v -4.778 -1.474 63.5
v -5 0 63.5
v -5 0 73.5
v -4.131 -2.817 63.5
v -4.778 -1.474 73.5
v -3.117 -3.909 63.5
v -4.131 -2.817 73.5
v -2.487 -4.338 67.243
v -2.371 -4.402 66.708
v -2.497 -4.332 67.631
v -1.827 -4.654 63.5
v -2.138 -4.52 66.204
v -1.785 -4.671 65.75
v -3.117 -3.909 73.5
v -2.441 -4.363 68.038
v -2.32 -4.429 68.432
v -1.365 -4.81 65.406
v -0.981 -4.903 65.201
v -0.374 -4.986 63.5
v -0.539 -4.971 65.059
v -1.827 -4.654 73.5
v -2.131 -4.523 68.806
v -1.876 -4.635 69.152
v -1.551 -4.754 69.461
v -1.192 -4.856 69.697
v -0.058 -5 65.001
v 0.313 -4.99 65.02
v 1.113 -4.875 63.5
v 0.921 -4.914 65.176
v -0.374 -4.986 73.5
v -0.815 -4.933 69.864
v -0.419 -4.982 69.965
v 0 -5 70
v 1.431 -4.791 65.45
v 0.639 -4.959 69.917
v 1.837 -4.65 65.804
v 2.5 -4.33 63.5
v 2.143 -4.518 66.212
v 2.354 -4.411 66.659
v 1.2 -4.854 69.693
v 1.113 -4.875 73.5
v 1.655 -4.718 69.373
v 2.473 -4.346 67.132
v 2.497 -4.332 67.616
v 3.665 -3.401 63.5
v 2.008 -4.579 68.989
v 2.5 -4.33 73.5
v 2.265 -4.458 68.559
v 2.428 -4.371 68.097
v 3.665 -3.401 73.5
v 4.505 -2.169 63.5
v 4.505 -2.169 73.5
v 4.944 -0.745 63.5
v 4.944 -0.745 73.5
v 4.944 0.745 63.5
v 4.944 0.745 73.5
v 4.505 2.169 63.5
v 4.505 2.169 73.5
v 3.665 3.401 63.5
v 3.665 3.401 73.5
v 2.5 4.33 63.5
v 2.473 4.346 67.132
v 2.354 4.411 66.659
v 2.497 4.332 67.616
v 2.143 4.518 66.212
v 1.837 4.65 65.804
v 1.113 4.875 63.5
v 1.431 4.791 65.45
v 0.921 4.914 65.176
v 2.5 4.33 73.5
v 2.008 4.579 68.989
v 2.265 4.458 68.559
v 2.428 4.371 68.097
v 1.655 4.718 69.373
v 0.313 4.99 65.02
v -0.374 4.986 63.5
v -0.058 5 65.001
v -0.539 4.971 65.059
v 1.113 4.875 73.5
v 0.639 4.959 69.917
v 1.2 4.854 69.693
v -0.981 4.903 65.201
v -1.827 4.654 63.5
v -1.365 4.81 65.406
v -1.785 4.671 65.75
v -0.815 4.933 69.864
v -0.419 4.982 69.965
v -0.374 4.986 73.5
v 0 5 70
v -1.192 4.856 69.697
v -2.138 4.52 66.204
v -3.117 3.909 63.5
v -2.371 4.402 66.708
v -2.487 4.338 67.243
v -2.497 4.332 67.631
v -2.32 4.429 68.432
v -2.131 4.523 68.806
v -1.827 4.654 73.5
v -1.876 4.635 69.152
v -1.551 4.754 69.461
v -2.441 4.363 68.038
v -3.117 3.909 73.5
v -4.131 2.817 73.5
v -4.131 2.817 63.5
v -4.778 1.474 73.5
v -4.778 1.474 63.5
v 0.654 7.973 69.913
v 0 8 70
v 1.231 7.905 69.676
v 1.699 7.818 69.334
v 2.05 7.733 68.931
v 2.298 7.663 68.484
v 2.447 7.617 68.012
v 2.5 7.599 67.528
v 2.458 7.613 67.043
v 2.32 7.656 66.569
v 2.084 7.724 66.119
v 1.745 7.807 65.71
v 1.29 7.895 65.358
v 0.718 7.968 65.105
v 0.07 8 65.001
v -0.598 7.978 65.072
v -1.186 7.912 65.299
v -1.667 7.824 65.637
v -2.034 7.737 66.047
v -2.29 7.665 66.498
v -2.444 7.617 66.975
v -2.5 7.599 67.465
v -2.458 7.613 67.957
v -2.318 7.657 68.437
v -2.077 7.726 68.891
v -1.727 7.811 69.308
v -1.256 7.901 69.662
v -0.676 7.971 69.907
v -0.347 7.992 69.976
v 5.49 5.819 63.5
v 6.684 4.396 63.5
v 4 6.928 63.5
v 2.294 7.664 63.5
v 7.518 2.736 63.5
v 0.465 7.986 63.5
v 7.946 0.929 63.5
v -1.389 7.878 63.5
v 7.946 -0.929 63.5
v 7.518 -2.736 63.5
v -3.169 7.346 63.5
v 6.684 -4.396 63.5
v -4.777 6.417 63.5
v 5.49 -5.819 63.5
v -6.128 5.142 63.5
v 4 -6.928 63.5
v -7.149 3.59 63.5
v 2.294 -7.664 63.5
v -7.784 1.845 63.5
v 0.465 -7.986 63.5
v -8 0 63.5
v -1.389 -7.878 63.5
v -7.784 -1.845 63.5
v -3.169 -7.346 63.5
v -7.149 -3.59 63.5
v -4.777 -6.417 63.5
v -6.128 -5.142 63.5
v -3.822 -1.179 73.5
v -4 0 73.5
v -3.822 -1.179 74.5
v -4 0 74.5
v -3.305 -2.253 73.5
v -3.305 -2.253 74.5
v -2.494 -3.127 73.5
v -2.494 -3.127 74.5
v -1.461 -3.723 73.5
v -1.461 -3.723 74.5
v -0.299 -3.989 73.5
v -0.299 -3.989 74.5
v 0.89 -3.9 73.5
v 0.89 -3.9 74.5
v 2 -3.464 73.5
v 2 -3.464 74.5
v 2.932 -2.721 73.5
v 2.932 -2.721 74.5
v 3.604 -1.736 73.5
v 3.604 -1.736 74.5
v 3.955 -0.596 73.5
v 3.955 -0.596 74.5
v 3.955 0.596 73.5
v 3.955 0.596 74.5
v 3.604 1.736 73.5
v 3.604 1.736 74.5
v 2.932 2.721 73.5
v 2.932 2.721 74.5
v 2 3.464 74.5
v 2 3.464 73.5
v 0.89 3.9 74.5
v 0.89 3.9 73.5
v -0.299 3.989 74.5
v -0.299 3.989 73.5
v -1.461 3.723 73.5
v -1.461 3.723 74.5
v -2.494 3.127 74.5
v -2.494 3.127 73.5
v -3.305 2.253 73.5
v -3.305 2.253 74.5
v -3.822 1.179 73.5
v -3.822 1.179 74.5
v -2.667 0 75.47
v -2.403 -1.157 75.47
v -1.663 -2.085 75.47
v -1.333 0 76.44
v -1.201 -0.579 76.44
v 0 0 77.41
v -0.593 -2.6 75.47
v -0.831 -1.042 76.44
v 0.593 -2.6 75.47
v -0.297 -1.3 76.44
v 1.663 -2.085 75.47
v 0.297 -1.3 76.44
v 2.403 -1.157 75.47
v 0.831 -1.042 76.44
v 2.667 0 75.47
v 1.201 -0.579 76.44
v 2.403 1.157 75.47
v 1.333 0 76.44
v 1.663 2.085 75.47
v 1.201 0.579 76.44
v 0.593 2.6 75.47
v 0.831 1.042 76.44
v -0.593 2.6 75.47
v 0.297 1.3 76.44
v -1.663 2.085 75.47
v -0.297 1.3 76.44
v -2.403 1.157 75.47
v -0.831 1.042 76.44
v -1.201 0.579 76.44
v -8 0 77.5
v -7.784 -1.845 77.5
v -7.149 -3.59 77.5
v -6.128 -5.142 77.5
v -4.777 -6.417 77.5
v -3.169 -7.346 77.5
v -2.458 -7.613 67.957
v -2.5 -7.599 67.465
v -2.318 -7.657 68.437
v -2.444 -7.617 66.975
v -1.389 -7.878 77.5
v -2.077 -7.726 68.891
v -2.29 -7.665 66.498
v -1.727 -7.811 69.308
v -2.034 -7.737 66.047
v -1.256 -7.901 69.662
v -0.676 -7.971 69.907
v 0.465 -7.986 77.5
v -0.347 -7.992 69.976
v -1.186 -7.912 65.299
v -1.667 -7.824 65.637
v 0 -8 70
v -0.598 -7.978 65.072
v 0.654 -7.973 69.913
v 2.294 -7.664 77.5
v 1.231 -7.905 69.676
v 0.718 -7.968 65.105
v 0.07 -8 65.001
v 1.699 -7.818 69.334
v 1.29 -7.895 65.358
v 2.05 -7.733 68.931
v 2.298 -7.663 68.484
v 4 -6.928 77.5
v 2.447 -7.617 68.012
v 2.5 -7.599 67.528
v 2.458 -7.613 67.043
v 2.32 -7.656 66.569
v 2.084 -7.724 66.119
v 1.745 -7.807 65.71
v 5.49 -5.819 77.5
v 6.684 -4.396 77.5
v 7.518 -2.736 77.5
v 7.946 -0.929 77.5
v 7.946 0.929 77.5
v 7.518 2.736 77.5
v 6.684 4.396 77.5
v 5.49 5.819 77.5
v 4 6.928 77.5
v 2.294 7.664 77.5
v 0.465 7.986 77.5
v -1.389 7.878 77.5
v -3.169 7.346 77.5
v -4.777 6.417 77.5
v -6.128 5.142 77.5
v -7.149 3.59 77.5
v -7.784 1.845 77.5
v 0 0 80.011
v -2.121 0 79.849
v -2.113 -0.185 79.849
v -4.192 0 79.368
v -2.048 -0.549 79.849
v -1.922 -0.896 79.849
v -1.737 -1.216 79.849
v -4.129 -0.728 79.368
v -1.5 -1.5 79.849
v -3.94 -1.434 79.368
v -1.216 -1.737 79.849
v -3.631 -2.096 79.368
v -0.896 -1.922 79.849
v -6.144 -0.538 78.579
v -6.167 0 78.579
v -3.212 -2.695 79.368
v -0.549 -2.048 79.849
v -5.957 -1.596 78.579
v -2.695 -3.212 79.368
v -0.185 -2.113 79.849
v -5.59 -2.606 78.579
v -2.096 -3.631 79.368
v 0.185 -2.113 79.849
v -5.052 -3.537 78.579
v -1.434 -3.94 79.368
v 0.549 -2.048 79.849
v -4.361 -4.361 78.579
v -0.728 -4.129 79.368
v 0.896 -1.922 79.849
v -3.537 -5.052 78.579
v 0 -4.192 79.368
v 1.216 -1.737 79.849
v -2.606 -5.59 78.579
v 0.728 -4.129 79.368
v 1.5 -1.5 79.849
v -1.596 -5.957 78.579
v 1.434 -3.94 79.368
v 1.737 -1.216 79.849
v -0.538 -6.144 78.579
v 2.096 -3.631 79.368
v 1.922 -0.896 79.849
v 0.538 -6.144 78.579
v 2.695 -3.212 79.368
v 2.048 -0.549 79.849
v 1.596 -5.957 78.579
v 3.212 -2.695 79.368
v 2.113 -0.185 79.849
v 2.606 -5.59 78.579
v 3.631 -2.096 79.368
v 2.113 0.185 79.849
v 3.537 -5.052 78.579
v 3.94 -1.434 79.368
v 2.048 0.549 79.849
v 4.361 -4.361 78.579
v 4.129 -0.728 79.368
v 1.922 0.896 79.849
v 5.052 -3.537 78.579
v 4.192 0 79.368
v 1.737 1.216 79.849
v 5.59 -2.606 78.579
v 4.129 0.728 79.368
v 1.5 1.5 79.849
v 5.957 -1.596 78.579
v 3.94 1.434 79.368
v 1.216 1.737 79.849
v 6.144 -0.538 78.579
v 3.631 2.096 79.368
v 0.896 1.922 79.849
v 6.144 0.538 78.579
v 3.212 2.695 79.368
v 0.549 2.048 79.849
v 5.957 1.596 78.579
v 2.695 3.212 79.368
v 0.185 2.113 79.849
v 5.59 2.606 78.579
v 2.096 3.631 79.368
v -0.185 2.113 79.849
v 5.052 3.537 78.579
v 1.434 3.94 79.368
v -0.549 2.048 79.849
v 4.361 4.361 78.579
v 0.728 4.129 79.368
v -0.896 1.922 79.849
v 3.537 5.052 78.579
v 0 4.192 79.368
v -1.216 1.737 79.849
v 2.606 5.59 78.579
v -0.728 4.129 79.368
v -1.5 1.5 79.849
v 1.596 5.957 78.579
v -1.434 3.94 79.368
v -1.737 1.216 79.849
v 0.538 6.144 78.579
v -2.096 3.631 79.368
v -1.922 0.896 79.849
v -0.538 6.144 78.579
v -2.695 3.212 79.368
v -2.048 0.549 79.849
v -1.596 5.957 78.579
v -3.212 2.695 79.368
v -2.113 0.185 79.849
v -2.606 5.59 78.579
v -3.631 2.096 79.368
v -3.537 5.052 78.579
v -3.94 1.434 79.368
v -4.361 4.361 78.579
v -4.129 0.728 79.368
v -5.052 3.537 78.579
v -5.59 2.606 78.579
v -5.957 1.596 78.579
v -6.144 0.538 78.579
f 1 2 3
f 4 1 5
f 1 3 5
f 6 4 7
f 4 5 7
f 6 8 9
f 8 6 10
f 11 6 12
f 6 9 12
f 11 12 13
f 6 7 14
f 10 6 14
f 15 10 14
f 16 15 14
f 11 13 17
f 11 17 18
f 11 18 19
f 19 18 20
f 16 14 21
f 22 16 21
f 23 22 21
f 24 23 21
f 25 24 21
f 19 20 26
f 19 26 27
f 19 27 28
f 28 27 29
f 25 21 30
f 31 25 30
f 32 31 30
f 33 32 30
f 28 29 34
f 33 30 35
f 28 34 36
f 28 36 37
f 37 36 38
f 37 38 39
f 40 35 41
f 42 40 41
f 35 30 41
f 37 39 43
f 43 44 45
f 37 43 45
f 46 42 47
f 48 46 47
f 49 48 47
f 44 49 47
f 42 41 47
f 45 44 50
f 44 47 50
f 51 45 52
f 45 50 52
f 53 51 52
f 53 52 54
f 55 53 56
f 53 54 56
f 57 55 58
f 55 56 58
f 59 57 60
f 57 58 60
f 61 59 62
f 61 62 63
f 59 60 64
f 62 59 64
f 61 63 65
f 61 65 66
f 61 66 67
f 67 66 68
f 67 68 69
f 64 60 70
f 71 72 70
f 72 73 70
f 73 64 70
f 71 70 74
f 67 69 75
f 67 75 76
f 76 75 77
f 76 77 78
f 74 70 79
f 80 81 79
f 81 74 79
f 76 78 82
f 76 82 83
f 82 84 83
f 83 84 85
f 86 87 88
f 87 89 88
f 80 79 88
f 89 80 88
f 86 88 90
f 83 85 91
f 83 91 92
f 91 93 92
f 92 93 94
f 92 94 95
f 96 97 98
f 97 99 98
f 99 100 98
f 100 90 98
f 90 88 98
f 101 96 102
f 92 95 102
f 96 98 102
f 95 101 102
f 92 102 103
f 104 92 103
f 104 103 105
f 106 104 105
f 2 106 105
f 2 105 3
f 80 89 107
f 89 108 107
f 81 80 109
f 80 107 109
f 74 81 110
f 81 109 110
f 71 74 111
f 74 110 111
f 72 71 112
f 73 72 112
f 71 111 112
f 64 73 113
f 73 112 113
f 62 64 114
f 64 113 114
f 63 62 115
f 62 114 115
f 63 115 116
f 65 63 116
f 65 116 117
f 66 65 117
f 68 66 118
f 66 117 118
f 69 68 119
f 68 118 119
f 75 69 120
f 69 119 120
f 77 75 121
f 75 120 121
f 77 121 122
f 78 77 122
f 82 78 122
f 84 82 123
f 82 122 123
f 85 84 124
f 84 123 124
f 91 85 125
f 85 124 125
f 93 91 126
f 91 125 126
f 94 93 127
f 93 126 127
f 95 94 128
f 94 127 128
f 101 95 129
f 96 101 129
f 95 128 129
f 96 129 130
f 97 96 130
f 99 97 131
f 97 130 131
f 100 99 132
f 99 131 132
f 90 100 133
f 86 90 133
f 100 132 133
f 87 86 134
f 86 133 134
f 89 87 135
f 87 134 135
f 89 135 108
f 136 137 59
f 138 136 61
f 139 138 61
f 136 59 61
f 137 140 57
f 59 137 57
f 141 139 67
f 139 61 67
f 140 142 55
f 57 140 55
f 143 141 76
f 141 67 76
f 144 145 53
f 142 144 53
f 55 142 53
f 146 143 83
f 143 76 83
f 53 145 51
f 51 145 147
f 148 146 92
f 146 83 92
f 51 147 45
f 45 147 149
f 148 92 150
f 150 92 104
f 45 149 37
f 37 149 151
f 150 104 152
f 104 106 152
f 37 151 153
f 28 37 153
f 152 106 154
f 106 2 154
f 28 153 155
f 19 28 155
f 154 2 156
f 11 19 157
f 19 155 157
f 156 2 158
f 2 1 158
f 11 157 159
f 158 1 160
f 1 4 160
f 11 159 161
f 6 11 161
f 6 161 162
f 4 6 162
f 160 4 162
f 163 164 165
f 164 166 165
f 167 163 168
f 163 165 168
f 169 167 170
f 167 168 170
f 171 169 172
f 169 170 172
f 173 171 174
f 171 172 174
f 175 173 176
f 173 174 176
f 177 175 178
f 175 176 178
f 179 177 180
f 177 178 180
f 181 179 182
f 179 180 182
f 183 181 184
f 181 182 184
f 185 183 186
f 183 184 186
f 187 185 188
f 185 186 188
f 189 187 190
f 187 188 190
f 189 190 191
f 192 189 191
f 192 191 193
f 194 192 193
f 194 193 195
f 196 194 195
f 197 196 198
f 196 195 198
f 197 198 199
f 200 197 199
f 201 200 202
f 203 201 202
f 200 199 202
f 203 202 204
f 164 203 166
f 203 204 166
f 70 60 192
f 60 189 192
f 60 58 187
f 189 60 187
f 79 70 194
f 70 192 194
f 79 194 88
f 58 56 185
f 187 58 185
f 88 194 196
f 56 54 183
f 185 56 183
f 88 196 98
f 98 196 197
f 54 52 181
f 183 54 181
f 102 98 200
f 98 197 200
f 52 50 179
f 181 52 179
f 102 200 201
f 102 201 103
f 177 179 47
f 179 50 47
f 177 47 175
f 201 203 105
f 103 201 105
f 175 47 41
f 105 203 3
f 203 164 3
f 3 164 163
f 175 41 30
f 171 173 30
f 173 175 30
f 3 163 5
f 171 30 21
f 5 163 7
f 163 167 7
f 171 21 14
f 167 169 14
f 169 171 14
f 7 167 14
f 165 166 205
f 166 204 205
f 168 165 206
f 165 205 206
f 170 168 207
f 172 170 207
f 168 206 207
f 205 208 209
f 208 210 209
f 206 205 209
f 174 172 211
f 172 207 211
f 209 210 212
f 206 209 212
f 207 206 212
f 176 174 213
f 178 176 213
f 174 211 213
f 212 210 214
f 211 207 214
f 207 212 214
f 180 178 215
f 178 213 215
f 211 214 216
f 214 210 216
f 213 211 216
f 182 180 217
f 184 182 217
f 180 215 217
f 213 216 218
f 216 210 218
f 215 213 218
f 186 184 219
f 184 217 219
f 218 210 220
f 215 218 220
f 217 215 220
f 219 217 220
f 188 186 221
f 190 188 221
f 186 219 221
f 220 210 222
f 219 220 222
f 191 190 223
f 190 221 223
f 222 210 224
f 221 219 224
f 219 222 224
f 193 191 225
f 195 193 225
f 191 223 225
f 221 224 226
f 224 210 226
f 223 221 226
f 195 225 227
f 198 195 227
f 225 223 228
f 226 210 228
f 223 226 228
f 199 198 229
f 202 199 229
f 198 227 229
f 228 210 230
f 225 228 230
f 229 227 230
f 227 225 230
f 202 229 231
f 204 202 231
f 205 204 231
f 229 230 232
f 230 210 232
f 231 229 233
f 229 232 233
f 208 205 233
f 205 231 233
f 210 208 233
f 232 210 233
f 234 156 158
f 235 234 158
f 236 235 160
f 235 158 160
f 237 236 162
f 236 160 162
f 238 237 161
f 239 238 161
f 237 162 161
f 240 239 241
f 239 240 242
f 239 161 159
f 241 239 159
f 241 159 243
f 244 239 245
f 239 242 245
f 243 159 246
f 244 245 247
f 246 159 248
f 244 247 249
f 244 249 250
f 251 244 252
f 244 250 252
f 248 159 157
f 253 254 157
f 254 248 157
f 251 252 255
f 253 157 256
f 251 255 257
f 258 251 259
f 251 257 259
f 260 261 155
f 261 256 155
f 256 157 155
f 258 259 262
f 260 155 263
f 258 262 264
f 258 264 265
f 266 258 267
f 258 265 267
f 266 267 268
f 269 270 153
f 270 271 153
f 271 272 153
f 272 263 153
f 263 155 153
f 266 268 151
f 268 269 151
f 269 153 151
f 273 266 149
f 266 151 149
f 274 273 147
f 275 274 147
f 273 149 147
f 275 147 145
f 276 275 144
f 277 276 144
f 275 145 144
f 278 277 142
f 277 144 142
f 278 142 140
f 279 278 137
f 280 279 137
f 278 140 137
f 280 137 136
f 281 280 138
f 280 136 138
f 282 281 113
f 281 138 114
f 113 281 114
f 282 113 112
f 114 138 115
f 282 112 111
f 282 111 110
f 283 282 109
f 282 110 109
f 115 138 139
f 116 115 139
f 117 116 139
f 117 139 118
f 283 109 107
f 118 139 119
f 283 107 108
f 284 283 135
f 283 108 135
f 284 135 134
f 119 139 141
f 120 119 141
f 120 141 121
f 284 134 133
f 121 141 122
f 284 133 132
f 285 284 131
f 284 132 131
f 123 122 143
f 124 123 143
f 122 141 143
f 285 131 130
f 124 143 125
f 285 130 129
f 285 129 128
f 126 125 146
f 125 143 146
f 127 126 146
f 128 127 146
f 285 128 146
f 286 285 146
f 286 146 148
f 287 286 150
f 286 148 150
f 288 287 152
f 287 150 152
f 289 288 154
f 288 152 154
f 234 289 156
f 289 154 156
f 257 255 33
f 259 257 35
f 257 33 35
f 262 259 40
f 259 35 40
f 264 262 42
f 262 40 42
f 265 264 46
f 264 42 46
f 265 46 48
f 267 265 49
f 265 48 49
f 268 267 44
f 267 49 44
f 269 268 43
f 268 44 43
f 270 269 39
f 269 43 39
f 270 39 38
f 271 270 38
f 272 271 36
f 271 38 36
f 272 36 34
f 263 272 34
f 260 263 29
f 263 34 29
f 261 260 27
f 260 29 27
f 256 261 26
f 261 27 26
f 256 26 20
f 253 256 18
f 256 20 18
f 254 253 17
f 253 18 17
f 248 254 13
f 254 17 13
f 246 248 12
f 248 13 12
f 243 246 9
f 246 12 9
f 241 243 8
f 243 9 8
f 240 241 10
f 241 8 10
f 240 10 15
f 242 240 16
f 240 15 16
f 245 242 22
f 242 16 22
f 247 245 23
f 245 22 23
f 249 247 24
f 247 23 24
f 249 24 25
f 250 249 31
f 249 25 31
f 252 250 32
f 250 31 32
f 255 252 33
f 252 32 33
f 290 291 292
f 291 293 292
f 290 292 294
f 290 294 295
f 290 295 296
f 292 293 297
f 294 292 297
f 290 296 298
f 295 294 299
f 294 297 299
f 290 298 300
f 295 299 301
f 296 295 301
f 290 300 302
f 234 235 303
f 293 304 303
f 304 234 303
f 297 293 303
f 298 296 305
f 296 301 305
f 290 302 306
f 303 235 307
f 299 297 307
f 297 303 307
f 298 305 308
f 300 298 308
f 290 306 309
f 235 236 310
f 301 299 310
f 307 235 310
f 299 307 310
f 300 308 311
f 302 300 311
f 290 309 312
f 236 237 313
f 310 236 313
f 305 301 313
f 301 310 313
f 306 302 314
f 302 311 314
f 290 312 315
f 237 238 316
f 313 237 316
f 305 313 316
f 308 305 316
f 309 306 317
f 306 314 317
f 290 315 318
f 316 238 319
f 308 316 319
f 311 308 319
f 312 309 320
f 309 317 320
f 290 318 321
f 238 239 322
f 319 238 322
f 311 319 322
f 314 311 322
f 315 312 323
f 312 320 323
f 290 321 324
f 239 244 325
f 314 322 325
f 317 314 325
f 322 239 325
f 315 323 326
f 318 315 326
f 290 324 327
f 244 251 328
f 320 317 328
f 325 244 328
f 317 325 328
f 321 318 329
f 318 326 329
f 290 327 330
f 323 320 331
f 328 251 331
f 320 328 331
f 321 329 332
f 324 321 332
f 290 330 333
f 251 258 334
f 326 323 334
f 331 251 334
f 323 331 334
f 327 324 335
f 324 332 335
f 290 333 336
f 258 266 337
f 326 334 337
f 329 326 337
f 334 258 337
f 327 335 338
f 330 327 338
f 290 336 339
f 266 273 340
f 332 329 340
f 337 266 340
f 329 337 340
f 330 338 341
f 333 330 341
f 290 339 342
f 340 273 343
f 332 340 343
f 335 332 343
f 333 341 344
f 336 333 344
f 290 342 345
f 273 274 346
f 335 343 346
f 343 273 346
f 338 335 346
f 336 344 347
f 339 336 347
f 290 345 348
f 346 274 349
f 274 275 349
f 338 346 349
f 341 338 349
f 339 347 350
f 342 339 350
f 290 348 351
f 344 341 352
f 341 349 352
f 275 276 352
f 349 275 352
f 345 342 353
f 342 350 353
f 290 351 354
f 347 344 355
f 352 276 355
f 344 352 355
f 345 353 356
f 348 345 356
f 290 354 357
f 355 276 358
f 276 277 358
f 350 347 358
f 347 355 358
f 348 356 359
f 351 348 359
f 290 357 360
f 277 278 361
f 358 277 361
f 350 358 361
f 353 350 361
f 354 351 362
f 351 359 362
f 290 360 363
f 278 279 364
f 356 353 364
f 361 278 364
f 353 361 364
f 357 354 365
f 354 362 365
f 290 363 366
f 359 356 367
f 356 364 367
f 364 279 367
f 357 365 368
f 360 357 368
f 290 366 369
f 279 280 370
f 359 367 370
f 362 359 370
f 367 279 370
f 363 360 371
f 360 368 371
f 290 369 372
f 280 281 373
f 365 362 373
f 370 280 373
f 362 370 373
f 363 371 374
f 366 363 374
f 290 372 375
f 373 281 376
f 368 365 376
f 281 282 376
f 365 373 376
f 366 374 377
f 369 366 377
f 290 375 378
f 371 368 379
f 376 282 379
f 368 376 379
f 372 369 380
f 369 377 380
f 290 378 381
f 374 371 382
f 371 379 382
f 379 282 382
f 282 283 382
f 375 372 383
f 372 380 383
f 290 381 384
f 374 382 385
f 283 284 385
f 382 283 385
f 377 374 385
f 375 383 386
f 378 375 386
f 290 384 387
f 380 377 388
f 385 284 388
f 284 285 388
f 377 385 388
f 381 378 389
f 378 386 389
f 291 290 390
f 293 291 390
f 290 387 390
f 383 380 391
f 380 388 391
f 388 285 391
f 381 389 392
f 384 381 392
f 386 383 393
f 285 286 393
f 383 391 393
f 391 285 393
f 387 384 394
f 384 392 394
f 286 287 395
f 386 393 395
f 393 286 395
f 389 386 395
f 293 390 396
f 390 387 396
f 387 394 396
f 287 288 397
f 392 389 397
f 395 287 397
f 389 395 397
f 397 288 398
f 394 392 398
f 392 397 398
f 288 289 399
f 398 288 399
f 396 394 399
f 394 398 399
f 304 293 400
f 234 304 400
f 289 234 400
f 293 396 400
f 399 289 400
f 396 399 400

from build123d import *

# Parameters (mm, degrees)
ESQUISSE3_R             = 2.5
ENL_V_MAT_EXTRU_1_DEPTH = 10


with BuildPart() as part:
    # Esquisse2 → Base-Révolution (revolve)
    with BuildSketch(Plane(origin=(0, 0, 0), x_dir=(0, 0, -1), z_dir=(1, 0, 0))):
        with BuildLine():
            Line((-63.5, 5), (-73.5, 5))
            Line((-73.5, 5), (-73.5, 4))
            Line((-73.5, 4), (-74.5, 4))
            Line((-74.5, 4), (-77.41039886, 0))
            Line((-77.41039886, 0), (-80.010874707, 0))
            ThreePointArc((-80.010874707, 0), (-79.368414789, 4.192388692), (-77.5, 8))
            Line((-77.5, 8), (-63.5, 8))
            Line((-63.5, 8), (-63.5, 5))
        make_face()
    revolve(axis=Axis((0, 0, 0), (0, 0, 1)))

    # Esquisse3 → Enlèv. mat.-Extru.1 (cut, symmetric)
    with BuildSketch(Plane(origin=(0, 0, 0), x_dir=(1, 0, 0), z_dir=(0, 1, 0))):
        with Locations((0, -67.5)):
            Circle(ESQUISSE3_R)
    extrude(amount=ENL_V_MAT_EXTRU_1_DEPTH, both=True, mode=Mode.SUBTRACT)


solid = part.part
